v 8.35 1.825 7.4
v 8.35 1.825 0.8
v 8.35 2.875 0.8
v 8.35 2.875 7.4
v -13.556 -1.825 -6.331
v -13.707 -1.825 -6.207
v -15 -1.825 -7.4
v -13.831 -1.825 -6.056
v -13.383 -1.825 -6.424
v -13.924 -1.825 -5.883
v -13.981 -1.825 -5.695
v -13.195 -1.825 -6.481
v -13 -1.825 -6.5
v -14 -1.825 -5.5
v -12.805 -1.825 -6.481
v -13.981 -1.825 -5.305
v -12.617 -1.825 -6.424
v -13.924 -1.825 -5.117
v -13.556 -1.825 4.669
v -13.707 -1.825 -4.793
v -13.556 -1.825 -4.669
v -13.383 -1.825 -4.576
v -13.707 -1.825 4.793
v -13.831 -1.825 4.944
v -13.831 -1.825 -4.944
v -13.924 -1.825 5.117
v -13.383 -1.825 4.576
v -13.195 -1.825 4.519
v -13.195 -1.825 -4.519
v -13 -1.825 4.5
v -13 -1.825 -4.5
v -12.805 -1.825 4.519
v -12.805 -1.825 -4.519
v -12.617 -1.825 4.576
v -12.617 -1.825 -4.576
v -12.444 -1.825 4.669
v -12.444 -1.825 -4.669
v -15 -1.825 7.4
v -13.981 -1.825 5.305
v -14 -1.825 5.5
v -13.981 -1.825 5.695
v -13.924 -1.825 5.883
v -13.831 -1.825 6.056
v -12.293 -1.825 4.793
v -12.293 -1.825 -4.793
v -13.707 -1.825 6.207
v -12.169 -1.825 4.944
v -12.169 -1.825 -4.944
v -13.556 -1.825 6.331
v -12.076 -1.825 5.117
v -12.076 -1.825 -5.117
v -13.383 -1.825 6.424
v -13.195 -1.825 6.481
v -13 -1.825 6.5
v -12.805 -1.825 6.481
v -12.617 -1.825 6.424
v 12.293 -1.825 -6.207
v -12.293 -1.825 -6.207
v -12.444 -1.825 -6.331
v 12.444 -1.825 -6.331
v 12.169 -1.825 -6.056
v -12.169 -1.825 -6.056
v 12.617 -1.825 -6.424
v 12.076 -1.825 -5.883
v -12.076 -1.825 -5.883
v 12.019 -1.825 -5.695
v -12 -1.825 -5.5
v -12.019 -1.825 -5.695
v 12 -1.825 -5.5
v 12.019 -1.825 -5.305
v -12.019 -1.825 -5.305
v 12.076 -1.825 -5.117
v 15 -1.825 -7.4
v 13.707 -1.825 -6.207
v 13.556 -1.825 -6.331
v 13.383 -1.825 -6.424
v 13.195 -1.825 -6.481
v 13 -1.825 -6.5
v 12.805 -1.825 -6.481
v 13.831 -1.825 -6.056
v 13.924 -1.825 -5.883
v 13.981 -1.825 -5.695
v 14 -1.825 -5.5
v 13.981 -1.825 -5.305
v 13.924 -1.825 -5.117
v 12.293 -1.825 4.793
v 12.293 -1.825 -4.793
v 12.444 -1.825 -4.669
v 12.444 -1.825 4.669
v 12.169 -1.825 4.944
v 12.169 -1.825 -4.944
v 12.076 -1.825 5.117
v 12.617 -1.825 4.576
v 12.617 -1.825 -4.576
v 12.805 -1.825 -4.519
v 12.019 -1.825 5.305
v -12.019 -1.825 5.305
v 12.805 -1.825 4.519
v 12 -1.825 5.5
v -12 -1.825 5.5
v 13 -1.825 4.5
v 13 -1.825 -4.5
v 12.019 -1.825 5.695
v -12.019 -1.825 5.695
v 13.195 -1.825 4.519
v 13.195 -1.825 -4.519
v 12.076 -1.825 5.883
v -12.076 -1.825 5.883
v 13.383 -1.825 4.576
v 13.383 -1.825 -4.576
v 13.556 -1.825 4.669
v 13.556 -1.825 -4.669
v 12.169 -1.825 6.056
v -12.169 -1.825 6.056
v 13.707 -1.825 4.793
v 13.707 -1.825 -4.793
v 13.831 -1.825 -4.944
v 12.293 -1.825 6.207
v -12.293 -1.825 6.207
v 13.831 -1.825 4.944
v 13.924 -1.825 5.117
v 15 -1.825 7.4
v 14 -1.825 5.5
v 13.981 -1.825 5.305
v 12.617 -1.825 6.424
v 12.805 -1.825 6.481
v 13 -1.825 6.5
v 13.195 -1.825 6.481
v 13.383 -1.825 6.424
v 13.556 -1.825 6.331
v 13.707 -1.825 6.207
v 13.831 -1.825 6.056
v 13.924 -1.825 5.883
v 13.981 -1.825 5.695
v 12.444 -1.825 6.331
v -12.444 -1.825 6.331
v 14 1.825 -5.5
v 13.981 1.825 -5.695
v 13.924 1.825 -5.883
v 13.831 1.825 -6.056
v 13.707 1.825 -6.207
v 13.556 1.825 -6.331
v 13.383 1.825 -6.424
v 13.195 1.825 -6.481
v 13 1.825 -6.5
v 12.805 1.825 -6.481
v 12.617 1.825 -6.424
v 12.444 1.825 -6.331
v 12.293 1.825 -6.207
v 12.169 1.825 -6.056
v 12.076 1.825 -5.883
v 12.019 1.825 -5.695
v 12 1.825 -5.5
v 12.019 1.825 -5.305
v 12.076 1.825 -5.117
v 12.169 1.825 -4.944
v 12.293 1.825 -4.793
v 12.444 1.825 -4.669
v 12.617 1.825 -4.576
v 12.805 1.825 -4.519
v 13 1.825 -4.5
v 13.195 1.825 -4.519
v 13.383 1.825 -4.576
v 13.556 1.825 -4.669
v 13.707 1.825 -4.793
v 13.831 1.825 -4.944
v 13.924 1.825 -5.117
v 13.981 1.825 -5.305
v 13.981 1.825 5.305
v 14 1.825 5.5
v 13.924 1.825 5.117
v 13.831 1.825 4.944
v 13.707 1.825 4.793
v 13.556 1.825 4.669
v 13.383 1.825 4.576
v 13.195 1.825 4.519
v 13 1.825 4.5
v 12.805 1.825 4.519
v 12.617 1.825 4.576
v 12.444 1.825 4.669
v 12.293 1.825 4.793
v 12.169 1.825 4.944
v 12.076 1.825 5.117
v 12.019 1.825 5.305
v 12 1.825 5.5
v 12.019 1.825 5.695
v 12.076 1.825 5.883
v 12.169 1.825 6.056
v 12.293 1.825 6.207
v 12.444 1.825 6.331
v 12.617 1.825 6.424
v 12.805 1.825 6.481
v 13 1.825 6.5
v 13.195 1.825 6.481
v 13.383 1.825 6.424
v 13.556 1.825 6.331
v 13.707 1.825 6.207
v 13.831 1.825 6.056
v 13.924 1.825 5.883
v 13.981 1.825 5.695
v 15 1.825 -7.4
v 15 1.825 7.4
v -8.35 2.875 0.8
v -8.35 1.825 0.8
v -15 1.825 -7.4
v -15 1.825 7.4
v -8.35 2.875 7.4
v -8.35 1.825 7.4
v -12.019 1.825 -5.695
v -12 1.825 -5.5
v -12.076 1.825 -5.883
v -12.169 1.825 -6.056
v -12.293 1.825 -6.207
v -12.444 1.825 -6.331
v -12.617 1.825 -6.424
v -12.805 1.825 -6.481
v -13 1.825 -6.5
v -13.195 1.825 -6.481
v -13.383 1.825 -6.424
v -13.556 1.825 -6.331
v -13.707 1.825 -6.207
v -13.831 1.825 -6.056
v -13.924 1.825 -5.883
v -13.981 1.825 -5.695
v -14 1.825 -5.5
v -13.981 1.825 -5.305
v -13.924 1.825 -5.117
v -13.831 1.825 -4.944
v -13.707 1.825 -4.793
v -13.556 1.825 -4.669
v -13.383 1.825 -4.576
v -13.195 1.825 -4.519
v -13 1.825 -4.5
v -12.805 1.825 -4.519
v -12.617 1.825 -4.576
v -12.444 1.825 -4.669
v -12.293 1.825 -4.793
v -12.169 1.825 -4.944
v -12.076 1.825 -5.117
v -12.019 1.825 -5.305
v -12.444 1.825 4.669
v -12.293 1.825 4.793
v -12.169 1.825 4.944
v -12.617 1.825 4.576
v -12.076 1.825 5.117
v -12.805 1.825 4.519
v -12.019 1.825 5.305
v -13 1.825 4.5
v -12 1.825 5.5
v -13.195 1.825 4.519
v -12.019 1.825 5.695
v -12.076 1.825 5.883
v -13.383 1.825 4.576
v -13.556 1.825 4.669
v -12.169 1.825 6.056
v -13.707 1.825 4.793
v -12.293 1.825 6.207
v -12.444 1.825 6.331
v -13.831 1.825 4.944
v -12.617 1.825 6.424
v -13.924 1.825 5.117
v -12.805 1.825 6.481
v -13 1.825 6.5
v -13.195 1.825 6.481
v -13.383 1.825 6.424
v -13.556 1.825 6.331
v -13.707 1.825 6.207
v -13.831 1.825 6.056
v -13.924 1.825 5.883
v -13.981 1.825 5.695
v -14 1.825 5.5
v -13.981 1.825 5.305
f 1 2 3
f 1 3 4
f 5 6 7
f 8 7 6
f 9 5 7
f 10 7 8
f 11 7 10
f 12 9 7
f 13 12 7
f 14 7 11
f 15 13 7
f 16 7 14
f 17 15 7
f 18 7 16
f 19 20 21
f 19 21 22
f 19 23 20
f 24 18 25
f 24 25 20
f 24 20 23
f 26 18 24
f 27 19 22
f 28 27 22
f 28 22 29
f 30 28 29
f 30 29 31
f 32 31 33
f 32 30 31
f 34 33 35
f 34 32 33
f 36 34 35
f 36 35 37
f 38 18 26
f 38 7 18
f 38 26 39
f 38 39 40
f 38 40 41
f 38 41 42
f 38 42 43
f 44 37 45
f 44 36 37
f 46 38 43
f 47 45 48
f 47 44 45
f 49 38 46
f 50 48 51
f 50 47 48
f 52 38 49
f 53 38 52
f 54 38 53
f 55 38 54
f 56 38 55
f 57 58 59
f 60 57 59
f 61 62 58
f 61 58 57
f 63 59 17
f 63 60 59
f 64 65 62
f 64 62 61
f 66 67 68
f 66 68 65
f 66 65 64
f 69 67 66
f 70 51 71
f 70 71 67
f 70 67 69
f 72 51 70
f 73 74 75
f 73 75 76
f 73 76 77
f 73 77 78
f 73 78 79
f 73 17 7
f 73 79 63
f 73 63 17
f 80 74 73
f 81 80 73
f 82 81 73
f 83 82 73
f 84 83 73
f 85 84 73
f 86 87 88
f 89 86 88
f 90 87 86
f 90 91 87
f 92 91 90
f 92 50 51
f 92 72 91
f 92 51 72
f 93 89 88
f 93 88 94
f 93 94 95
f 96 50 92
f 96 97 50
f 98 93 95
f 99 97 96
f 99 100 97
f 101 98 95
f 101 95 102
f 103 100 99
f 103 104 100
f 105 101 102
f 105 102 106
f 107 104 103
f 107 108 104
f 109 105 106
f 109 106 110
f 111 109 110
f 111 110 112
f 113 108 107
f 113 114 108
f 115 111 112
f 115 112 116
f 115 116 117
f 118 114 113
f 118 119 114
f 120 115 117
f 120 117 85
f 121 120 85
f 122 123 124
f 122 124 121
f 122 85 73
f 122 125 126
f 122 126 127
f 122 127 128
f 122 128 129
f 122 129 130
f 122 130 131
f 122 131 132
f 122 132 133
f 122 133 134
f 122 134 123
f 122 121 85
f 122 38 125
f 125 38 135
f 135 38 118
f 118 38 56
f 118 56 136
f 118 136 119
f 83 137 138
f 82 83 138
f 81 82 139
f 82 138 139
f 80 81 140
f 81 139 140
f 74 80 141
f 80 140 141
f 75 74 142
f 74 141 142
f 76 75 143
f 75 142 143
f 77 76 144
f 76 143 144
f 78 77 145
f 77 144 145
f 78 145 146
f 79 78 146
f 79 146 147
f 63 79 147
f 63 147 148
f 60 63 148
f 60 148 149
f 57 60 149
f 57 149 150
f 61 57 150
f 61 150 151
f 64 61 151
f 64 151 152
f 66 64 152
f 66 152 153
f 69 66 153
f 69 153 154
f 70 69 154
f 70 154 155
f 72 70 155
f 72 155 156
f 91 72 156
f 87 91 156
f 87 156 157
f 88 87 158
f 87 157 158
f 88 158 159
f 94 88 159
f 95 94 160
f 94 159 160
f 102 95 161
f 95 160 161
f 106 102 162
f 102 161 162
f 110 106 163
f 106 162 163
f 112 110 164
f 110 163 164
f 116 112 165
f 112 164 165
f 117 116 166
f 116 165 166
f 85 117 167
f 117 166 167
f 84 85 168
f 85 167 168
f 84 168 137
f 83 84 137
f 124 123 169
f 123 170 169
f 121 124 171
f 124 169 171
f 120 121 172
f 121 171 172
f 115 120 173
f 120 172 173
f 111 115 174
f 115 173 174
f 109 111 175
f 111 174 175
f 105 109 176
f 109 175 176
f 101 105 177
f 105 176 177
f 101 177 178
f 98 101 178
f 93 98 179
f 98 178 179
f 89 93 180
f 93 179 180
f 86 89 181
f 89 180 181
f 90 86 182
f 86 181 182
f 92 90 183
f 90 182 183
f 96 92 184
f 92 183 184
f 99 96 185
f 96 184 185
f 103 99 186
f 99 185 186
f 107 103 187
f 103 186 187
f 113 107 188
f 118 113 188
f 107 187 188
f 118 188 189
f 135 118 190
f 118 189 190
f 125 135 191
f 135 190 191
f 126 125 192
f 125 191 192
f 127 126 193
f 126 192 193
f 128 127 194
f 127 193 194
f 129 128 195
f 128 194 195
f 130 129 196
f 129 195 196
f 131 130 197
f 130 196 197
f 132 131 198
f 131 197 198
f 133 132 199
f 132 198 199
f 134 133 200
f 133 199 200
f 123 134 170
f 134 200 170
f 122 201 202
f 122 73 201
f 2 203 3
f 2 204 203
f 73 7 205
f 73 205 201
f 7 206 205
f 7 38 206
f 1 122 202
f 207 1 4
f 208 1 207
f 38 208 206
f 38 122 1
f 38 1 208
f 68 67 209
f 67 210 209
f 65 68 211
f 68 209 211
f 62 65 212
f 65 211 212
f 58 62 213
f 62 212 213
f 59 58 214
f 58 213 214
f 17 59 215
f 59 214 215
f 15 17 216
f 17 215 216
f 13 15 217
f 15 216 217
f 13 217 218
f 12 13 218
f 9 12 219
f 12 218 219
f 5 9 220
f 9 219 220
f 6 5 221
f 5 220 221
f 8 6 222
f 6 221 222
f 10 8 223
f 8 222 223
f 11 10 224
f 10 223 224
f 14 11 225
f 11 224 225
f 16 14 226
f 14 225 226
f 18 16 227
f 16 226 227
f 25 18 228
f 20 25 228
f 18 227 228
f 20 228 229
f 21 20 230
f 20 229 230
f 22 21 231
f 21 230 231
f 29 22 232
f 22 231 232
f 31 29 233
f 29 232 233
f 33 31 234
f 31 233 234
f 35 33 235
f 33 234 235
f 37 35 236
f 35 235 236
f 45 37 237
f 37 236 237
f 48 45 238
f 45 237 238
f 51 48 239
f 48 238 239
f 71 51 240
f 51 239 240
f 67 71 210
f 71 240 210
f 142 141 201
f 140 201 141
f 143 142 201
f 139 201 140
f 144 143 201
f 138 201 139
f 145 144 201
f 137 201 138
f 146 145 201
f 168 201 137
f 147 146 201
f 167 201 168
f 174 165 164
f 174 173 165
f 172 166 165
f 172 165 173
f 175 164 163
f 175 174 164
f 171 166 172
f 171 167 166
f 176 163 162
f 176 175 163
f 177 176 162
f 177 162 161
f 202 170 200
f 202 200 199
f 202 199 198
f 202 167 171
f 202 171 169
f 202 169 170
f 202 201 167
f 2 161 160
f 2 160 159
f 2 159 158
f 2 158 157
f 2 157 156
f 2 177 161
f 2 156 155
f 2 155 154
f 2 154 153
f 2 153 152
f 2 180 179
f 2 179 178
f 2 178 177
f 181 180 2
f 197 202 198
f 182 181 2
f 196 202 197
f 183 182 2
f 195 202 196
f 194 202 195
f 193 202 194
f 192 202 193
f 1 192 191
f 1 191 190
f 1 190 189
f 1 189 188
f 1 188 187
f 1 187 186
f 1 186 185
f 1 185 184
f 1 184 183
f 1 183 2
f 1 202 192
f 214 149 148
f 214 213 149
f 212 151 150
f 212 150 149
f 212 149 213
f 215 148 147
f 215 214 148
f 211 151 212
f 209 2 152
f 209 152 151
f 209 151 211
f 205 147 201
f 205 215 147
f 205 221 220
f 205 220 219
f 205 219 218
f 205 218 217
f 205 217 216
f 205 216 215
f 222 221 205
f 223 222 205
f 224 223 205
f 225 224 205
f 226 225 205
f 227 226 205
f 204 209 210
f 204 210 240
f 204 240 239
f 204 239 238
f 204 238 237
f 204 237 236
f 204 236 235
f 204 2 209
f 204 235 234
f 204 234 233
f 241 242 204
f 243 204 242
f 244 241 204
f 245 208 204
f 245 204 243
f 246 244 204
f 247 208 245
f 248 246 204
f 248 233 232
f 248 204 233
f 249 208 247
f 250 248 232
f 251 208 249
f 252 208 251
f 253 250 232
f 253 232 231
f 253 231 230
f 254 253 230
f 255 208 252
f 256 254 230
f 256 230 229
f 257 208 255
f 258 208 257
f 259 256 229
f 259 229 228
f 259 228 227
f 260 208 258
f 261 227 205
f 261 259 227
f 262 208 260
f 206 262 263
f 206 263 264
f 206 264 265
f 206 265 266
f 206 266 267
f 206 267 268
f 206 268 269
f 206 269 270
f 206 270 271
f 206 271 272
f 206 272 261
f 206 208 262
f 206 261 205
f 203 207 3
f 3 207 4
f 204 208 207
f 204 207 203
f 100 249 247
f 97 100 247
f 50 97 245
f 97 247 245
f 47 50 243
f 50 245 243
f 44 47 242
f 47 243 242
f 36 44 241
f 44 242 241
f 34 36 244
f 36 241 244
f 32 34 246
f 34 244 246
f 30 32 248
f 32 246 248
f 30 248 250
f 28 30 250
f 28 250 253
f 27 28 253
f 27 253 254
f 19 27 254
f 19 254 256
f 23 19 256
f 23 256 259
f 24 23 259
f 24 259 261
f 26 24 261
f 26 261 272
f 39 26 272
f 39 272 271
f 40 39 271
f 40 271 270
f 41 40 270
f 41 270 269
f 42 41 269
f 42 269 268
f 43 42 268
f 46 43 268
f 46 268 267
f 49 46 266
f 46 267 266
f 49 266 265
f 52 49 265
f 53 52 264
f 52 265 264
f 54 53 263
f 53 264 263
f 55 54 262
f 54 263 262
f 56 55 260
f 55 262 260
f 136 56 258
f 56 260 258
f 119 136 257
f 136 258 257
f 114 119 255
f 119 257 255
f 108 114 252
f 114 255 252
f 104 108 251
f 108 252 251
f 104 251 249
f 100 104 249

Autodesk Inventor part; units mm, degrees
ref_plane "YZ Plane" through (0, 0, 0) normal (1, 0, 0) x (0, 1, 0)
ref_plane "XZ Plane" through (0, 0, 0) normal (0, 1, 0) x (-1, 0, 0)
ref_plane "XY Plane" through (0, 0, 0) normal (0, 0, 1) x (1, 0, 0)
sketch "Эскиз1" plane through (0, 0, 0) normal (0, 1, 0) x (-1, 0, 0)
  line L0 (-15, 7.4) -> (15, 7.4)
  line L1 (15, 7.4) -> (15, -7.4)
  line L2 (15, -7.4) -> (-15, -7.4)
  line L3 (-15, -7.4) -> (-15, 7.4)
  line L4 (-15, 7.4) -> (15, -7.4) construction
  line L5 (15, 7.4) -> (-15, -7.4) construction
  point P0 (0, 0)
  dimension "d0" = 30
  dimension "d1" = 14.8
extrude "Выдавливание1" add sketch "Эскиз1" along normal mid plane 3.65
sketch "Эскиз2" plane through (0, -1.825, 0) normal (0, -1, 0) x (1, 0, 0)
  line L0 (-15, 7.4) -> (15, 7.4) projected
  line L1 (8.35, 7.4) -> (-8.35, 7.4)
  line L2 (-8.35, 7.4) -> (-8.35, 0.8)
  line L3 (-8.35, 0.8) -> (8.35, 0.8)
  line L4 (8.35, 0.8) -> (8.35, 7.4)
  point P0 (0, 0)
  point P1 (0, 7.4)
  dimension "d4" = 16.7
  dimension "d5" = 6.6
extrude "Выдавливание2" add sketch "Эскиз2" against normal blind 4.7
sketch "Эскиз3" plane through (0, 1.825, 0) normal (0, 1, 0) x (1, 0, 0)
  line L0 (15, -7.4) -> (-15, -7.4) projected
  line L1 (-15, -7.4) -> (-15, 7.4) projected
  line L2 (-15, 7.4) -> (15, 7.4) projected
  line L3 (15, 7.4) -> (15, -7.4) projected
  line L4 (13, -5.5) -> (-13, -5.5)
  line L5 (-13, -5.5) -> (-13, 5.5)
  line L6 (-13, 5.5) -> (13, 5.5)
  line L7 (13, 5.5) -> (13, -5.5)
  line L8 (13, -5.5) -> (-13, 5.5) construction
  line L9 (-13, -5.5) -> (13, 5.5) construction
  circle A0 centre (-13, -5.5) radius 1
  circle A1 centre (-13, 5.5) radius 1
  circle A2 centre (13, 5.5) radius 1
  circle A3 centre (13, -5.5) radius 1
  point P0 (0, 0)
  dimension "d8" = 26
  dimension "d9" = 11
  dimension "d10" = 2
  dimension "d11" = 2
  dimension "d12" = 2
  dimension "d13" = 2
extrude "Выдавливание3" cut sketch "Эскиз3" against normal blind 10 contours A0 L5 L4 | L4 L5 A0 | A3 L7 L4 | L4 L7 A3 | A1 L6 L5 | L5 L6 A1 | A2 L6 L7 | L7 L6 A2
properties part number "usb_camera_board"
